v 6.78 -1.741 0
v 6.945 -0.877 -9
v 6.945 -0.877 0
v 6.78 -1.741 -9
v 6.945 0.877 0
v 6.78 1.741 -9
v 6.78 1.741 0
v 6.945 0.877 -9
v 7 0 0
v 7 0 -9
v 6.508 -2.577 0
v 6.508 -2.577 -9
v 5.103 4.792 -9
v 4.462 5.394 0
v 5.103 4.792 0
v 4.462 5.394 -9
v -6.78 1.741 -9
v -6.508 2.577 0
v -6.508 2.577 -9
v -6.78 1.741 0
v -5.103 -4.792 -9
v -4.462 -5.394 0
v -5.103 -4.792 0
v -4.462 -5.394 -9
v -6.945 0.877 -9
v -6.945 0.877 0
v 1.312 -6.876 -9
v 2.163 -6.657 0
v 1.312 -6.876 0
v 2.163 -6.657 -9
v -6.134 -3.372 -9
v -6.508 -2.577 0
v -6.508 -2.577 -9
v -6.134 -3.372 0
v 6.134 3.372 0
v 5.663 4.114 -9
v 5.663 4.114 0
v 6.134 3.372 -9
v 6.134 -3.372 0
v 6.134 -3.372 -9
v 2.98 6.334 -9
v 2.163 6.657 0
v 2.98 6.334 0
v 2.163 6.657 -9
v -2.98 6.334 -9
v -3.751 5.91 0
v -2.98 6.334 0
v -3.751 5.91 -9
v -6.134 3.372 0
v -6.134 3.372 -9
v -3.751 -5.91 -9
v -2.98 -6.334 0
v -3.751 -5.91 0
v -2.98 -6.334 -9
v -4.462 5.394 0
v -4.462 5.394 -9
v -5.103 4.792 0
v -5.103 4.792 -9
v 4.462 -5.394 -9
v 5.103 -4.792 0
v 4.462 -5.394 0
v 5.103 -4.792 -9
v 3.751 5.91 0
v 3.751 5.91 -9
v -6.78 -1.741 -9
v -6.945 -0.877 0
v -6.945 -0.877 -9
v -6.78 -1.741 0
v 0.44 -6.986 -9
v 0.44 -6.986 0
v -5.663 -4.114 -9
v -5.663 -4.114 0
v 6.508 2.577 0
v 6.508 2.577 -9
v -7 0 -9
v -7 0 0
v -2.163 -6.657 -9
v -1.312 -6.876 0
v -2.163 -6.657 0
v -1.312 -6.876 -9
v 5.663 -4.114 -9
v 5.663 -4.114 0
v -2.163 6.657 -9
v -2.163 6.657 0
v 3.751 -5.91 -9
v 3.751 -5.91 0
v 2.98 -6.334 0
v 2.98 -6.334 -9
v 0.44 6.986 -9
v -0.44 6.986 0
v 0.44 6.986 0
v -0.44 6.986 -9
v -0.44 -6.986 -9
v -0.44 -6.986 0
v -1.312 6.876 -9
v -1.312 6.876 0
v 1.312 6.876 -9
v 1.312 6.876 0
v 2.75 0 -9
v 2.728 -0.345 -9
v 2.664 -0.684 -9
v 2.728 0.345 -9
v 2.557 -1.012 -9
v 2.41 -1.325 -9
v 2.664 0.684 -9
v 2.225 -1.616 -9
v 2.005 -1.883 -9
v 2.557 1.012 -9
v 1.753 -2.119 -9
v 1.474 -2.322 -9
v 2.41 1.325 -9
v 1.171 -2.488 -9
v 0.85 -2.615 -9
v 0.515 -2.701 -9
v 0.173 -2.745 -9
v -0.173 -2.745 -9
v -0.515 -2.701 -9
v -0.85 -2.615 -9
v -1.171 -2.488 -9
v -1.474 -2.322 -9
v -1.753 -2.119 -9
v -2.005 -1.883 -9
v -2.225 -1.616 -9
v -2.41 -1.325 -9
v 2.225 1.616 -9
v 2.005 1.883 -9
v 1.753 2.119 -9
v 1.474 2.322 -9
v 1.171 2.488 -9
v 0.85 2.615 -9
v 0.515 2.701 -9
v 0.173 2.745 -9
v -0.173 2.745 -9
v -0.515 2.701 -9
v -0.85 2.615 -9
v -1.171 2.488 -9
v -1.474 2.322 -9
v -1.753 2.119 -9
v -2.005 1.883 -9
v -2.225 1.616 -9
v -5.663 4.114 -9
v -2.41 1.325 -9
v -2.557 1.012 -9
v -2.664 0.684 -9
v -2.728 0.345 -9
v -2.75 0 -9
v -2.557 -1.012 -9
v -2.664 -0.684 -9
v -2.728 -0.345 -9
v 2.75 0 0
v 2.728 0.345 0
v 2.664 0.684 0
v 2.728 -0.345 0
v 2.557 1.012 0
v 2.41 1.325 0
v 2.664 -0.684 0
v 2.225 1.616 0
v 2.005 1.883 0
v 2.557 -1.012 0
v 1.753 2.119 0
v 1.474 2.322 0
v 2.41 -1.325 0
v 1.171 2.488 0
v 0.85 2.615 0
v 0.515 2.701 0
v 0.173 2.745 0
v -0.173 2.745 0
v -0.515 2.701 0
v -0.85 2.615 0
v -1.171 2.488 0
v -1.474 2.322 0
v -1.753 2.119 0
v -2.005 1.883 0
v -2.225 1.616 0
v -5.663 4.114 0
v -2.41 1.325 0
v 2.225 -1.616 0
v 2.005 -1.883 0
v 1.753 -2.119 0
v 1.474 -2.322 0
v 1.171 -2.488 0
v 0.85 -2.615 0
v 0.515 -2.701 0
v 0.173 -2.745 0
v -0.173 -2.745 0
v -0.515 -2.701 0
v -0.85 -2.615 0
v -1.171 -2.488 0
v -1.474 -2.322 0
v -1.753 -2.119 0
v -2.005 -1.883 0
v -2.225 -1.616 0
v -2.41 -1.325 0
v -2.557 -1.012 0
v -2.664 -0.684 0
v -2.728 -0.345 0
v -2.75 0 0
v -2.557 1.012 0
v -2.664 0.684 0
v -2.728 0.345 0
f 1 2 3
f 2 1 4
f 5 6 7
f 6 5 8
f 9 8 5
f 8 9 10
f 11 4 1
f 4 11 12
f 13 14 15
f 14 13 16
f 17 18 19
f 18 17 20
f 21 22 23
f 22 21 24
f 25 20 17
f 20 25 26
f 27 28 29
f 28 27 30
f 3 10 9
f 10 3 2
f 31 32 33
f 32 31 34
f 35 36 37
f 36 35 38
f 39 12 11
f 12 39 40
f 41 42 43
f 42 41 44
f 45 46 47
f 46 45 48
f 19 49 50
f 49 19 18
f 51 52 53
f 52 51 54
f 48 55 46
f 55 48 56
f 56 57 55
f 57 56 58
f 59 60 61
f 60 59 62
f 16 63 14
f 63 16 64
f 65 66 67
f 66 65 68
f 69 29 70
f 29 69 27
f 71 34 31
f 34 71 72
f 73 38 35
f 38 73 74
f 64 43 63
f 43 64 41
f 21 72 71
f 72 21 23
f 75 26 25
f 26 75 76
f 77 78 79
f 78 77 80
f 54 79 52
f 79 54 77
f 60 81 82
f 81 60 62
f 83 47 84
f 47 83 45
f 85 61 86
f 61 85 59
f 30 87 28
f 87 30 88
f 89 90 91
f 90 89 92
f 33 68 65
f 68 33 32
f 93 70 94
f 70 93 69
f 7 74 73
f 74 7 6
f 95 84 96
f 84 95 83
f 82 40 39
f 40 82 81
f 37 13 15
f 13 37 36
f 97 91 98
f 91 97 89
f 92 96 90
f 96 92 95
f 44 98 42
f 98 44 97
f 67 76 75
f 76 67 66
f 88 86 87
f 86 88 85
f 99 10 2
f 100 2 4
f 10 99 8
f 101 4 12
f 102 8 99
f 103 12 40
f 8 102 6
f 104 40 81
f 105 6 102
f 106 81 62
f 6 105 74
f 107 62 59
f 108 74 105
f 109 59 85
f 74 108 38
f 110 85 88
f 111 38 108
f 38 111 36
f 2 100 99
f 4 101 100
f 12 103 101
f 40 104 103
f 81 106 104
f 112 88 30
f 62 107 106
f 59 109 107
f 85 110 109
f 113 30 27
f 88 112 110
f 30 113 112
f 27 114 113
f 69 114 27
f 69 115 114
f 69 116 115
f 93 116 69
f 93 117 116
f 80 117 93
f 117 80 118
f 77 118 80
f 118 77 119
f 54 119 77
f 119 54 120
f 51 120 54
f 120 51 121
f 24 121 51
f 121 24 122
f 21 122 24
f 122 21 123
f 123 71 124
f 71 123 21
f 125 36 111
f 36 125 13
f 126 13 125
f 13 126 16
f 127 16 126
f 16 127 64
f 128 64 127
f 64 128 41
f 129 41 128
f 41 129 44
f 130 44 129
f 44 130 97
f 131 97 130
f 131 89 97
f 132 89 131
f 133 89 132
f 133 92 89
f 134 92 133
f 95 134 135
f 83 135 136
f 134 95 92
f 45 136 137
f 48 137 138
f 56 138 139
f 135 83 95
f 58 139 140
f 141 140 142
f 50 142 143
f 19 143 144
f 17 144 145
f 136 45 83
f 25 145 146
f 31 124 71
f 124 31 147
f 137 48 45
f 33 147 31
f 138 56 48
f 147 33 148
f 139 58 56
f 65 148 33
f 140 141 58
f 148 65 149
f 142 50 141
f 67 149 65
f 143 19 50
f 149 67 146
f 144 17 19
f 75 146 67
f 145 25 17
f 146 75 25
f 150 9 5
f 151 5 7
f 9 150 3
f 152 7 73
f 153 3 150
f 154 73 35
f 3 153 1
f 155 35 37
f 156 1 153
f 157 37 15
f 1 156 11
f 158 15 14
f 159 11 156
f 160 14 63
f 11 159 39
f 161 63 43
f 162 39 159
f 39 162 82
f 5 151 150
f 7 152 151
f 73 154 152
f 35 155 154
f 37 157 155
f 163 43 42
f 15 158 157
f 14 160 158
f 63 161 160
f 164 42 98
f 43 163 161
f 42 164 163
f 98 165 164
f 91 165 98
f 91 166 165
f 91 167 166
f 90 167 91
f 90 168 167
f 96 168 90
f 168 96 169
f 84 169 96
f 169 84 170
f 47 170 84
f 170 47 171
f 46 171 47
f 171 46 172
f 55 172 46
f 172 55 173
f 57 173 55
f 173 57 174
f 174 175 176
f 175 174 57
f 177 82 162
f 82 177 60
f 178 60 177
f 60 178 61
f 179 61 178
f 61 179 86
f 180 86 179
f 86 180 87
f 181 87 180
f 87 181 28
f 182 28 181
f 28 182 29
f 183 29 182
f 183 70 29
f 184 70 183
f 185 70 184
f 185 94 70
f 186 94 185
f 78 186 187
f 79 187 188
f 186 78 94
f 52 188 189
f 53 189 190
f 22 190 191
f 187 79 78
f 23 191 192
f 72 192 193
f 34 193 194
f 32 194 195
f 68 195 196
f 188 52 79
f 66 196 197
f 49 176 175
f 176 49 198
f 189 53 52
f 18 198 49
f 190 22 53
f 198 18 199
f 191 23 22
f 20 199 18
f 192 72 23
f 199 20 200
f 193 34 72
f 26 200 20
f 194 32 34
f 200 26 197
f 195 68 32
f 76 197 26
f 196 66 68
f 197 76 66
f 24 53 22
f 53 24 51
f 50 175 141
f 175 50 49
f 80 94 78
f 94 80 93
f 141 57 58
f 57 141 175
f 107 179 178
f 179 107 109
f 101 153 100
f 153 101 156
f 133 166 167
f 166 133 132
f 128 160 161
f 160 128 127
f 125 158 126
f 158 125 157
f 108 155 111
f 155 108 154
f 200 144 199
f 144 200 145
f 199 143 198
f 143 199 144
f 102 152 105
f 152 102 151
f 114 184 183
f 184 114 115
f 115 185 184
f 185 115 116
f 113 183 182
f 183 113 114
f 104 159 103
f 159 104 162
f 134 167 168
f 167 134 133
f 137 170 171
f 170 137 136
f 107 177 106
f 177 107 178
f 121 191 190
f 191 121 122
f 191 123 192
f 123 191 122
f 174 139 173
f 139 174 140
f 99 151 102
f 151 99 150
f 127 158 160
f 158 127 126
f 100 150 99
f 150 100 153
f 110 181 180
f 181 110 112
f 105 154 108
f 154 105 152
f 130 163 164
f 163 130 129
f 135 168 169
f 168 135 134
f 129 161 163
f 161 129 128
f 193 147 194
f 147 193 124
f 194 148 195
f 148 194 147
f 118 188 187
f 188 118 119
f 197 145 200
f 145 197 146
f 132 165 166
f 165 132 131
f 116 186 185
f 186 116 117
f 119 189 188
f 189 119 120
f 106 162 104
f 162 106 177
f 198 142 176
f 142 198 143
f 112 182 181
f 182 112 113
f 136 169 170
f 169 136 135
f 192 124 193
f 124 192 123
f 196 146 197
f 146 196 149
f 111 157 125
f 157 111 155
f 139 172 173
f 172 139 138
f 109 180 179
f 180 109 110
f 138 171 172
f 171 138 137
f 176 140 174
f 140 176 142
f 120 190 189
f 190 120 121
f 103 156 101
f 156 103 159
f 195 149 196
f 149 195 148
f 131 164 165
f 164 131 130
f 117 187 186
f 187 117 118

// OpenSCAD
$fn = 50;


difference() {
	union() {
		translate(v = [0, 0, -9.0000000000]) {
			cylinder(h = 9, r = 7.0000000000);
		}
		cylinder(h = 0, r = 10.0000000000);
	}
	union() {
		#translate(v = [0, 0, -9]) {
			cylinder(h = 9, r = 2.7500000000);
		}
	}
}
